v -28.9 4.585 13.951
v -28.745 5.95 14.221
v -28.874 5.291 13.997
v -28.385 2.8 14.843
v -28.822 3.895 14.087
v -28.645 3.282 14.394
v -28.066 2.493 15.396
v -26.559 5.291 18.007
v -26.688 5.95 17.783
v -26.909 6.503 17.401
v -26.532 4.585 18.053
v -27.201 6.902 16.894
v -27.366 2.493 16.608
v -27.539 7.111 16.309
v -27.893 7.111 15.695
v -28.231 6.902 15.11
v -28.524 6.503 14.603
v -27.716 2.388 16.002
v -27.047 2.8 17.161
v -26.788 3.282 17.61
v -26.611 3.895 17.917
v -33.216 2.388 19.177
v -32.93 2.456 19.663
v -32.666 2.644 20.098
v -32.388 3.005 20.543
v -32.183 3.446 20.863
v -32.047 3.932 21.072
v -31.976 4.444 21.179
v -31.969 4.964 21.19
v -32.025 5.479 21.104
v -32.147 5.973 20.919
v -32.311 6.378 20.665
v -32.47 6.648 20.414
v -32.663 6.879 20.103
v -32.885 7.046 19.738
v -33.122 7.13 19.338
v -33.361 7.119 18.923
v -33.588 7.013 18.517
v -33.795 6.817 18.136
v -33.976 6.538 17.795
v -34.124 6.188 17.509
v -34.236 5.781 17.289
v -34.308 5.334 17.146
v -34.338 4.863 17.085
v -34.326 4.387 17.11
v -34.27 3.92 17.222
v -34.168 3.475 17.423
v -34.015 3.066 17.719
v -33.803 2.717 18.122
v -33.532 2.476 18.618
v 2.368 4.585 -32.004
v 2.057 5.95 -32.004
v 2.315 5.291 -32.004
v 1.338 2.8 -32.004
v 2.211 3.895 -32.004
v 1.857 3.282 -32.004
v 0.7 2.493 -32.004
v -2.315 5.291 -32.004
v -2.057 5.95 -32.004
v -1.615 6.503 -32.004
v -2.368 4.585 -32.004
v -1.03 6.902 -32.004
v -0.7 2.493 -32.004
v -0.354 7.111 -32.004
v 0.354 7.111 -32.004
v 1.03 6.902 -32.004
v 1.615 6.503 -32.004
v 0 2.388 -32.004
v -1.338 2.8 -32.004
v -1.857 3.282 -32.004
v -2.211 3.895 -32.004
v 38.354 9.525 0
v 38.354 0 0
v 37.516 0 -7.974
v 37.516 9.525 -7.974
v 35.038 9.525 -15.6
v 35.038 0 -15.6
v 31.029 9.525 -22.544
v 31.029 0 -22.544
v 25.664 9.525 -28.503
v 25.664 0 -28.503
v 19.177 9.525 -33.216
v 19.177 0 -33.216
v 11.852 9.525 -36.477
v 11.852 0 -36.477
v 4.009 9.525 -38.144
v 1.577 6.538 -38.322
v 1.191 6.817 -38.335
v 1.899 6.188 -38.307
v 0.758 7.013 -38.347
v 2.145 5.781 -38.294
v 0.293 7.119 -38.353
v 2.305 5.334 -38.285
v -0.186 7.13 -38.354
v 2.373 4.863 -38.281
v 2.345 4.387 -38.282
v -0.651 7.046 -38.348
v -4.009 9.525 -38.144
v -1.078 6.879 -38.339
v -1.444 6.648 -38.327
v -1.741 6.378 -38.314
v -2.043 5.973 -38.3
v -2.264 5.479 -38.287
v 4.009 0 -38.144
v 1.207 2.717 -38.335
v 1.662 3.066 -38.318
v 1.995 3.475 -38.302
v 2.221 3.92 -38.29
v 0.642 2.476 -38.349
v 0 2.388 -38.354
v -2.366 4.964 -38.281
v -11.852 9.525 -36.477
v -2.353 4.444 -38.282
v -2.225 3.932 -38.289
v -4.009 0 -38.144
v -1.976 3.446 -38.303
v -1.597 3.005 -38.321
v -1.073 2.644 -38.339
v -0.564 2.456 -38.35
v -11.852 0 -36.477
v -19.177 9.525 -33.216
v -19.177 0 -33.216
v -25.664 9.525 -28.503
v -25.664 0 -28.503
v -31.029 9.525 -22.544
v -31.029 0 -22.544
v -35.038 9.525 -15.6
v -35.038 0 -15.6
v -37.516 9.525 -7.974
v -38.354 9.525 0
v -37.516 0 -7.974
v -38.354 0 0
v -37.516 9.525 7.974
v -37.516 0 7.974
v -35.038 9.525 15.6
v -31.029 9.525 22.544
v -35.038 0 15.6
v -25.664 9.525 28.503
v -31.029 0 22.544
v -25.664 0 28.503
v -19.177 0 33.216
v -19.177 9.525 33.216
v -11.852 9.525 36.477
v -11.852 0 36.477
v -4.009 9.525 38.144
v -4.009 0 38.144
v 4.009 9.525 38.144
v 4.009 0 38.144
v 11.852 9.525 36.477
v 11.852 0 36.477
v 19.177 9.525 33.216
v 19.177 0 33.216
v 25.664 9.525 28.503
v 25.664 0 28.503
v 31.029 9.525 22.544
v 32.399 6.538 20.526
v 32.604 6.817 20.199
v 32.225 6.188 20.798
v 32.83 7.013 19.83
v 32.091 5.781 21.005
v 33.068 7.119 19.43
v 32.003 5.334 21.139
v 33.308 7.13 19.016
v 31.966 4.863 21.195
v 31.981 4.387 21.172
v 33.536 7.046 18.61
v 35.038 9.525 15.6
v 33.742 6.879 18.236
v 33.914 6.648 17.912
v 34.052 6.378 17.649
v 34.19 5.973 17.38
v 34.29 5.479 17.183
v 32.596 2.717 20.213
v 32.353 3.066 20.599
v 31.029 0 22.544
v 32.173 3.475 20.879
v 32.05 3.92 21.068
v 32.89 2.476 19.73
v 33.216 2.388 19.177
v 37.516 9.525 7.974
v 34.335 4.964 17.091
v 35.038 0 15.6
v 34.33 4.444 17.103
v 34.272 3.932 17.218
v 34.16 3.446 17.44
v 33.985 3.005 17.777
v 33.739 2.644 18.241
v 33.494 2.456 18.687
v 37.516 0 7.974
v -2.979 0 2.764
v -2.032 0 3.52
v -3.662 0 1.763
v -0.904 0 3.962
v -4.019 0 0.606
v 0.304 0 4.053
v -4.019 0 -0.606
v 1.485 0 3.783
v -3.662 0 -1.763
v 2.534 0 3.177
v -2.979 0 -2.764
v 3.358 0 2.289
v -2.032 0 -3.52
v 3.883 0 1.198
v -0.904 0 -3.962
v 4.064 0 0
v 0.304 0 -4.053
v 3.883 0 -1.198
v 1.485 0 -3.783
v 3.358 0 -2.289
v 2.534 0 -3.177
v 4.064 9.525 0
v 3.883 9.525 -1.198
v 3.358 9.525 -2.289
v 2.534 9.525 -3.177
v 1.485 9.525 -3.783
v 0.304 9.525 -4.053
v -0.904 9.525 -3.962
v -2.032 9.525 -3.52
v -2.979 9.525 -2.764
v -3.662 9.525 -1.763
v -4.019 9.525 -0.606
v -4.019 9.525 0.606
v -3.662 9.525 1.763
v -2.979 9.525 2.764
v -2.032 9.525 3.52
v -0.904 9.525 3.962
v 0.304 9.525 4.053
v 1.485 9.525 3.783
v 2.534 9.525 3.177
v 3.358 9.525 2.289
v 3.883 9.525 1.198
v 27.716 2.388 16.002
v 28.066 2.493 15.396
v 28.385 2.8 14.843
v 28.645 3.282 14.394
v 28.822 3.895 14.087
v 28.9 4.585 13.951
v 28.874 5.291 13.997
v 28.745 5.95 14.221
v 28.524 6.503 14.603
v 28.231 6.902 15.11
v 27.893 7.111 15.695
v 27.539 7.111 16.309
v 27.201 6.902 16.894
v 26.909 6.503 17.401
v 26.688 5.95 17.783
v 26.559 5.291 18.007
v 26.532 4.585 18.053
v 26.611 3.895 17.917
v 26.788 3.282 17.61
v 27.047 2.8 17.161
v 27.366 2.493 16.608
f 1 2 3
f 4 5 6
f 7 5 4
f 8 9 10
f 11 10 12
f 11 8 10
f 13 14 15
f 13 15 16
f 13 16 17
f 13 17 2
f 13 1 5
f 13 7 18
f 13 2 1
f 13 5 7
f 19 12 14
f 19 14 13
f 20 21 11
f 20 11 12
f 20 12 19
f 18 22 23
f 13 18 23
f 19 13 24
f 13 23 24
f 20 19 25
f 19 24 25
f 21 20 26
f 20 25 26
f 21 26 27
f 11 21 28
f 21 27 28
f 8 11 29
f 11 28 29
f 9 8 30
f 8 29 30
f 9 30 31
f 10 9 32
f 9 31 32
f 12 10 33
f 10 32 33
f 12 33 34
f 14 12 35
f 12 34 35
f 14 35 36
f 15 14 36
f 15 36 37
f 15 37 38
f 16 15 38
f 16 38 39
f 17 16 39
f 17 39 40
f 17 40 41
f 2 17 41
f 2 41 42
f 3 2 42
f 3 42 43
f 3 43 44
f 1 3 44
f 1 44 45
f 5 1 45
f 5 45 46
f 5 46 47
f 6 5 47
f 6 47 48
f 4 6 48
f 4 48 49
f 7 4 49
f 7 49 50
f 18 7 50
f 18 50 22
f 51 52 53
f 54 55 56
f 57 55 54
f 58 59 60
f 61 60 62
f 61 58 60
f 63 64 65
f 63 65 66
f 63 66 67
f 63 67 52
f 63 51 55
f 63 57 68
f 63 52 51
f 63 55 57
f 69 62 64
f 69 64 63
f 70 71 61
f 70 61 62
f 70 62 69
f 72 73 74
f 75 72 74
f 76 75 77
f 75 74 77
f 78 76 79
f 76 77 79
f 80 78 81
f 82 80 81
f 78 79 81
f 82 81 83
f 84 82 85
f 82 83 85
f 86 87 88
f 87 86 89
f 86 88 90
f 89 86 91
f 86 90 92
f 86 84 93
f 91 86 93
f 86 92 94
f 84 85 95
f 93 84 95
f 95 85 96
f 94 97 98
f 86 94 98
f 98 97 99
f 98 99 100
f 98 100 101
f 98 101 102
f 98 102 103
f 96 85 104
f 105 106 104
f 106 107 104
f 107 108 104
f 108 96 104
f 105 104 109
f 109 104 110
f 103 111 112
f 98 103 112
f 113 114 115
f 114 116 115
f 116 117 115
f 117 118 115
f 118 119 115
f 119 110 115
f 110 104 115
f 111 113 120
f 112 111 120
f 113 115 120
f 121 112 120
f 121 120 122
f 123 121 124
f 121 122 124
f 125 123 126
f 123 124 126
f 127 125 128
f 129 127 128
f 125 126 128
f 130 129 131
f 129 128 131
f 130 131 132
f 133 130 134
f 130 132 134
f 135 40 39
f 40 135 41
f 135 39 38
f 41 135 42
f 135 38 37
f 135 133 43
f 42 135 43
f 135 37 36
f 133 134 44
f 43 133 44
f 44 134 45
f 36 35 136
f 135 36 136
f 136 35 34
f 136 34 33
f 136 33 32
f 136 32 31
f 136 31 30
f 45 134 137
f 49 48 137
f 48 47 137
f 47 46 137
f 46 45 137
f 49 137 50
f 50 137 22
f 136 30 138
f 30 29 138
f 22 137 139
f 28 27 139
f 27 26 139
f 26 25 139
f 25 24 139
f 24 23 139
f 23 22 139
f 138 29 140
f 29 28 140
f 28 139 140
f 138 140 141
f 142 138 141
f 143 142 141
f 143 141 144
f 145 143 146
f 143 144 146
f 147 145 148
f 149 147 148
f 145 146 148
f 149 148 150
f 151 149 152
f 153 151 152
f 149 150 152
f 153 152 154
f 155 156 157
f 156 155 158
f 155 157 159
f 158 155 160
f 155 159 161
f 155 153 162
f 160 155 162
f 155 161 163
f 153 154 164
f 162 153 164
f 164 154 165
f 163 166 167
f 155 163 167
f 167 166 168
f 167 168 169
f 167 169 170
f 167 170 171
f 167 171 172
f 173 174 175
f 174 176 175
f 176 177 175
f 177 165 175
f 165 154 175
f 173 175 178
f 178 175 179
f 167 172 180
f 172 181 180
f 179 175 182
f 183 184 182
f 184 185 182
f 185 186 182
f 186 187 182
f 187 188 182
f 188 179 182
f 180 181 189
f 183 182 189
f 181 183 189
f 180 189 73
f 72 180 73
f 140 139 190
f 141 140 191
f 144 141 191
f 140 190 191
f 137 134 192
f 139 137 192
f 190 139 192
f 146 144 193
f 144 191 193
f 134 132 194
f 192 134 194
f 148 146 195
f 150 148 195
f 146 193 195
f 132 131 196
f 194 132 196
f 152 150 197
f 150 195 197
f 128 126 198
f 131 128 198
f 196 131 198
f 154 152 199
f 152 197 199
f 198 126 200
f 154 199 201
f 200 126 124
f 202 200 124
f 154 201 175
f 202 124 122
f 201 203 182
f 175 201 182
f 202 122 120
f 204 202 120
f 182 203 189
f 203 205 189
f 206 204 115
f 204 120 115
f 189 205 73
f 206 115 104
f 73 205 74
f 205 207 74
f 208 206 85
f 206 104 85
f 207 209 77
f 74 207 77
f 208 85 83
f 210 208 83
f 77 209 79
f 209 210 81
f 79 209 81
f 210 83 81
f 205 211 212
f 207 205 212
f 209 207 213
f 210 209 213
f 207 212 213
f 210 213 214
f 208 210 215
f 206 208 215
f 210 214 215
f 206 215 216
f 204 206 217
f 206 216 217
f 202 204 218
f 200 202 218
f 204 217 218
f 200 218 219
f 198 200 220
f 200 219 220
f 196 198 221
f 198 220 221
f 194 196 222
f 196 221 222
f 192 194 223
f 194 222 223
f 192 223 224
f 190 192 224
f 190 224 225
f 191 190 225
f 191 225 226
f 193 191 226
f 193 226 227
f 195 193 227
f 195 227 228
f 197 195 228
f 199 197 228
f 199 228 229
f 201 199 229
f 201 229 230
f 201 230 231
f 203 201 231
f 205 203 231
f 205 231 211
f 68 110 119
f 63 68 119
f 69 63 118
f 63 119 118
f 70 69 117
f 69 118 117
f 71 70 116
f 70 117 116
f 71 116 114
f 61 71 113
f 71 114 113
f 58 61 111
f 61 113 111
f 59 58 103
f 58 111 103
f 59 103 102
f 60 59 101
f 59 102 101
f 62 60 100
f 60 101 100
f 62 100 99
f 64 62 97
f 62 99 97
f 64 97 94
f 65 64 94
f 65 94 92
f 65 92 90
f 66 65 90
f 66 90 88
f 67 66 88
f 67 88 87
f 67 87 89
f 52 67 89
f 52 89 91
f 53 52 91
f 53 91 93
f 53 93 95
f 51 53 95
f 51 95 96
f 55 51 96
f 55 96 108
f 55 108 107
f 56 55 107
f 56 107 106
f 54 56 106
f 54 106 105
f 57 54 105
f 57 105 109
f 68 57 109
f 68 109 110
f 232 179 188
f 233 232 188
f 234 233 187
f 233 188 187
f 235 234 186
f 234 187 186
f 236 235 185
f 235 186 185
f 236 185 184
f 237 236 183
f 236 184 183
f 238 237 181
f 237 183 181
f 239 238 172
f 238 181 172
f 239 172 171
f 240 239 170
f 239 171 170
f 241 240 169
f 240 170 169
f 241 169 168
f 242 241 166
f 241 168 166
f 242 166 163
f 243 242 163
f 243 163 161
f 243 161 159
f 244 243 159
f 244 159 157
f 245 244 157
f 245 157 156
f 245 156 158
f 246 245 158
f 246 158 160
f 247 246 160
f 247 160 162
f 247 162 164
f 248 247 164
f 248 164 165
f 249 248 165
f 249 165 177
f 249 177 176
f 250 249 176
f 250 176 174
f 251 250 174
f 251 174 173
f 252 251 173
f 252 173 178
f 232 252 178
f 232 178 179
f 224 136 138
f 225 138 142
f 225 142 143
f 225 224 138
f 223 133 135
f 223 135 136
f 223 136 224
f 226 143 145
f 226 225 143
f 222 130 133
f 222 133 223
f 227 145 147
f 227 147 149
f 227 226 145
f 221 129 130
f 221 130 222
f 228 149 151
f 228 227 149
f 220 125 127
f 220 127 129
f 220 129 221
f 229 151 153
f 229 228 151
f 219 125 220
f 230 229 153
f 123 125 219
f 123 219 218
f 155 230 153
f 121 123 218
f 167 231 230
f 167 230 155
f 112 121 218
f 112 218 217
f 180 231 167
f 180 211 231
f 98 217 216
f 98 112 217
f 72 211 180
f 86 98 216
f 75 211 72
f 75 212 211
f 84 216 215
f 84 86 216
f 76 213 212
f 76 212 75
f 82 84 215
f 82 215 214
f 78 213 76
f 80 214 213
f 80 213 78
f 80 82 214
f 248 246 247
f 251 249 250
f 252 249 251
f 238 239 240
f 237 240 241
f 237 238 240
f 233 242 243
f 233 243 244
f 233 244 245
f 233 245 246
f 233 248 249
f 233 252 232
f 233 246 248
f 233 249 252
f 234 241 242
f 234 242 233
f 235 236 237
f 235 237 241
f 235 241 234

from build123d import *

# Parameters (mm, degrees)
SKETCH1_R           = 38.354
BOSS_EXTRUDE1_DEPTH = 9.525
SKETCH4_R           = 2.3749
CUT_EXTRUDE2_DEPTH  = 6.35
CIRPATTERN1_COUNT   = 3
SKETCH6_R           = 4.064
CUT_EXTRUDE4_DEPTH  = 56.070720663


with BuildPart() as part:
    # Sketch1 → Boss-Extrude1 (new body)
    with BuildSketch(Plane(origin=(0, 0, 0), x_dir=(1, 0, 0), z_dir=(0, 1, 0))):
        Circle(SKETCH1_R)
    extrude(amount=BOSS_EXTRUDE1_DEPTH)

    # Sketch4 → Cut-Extrude2 (cut)
    with BuildSketch(Plane(origin=(-33.215538337, 0, 19.177), x_dir=(0, -1, 0), z_dir=(-0.8660254037844433, 0, 0.49999999999999195))):
        with Locations((-4.7625, 0)):
            Circle(SKETCH4_R)
    cut_extrude2 = extrude(amount=-CUT_EXTRUDE2_DEPTH, mode=Mode.SUBTRACT)

    # CirPattern1: Cut-Extrude2 ×3 about axis
    cirpattern1_axis = Axis((0, 10.00125, 0), (0, -1, 0))
    for i in range(1, CIRPATTERN1_COUNT):
        add(cut_extrude2.rotate(cirpattern1_axis, i * 360 / CIRPATTERN1_COUNT), mode=Mode.SUBTRACT)

    # Sketch6 → Cut-Extrude4 (cut, through all)
    with BuildSketch(Plane(origin=(0, 9.525, 0), x_dir=(1, 0, 0), z_dir=(0, 1, 0))):
        Circle(SKETCH6_R)
    extrude(amount=-CUT_EXTRUDE4_DEPTH, mode=Mode.SUBTRACT)


solid = part.part
